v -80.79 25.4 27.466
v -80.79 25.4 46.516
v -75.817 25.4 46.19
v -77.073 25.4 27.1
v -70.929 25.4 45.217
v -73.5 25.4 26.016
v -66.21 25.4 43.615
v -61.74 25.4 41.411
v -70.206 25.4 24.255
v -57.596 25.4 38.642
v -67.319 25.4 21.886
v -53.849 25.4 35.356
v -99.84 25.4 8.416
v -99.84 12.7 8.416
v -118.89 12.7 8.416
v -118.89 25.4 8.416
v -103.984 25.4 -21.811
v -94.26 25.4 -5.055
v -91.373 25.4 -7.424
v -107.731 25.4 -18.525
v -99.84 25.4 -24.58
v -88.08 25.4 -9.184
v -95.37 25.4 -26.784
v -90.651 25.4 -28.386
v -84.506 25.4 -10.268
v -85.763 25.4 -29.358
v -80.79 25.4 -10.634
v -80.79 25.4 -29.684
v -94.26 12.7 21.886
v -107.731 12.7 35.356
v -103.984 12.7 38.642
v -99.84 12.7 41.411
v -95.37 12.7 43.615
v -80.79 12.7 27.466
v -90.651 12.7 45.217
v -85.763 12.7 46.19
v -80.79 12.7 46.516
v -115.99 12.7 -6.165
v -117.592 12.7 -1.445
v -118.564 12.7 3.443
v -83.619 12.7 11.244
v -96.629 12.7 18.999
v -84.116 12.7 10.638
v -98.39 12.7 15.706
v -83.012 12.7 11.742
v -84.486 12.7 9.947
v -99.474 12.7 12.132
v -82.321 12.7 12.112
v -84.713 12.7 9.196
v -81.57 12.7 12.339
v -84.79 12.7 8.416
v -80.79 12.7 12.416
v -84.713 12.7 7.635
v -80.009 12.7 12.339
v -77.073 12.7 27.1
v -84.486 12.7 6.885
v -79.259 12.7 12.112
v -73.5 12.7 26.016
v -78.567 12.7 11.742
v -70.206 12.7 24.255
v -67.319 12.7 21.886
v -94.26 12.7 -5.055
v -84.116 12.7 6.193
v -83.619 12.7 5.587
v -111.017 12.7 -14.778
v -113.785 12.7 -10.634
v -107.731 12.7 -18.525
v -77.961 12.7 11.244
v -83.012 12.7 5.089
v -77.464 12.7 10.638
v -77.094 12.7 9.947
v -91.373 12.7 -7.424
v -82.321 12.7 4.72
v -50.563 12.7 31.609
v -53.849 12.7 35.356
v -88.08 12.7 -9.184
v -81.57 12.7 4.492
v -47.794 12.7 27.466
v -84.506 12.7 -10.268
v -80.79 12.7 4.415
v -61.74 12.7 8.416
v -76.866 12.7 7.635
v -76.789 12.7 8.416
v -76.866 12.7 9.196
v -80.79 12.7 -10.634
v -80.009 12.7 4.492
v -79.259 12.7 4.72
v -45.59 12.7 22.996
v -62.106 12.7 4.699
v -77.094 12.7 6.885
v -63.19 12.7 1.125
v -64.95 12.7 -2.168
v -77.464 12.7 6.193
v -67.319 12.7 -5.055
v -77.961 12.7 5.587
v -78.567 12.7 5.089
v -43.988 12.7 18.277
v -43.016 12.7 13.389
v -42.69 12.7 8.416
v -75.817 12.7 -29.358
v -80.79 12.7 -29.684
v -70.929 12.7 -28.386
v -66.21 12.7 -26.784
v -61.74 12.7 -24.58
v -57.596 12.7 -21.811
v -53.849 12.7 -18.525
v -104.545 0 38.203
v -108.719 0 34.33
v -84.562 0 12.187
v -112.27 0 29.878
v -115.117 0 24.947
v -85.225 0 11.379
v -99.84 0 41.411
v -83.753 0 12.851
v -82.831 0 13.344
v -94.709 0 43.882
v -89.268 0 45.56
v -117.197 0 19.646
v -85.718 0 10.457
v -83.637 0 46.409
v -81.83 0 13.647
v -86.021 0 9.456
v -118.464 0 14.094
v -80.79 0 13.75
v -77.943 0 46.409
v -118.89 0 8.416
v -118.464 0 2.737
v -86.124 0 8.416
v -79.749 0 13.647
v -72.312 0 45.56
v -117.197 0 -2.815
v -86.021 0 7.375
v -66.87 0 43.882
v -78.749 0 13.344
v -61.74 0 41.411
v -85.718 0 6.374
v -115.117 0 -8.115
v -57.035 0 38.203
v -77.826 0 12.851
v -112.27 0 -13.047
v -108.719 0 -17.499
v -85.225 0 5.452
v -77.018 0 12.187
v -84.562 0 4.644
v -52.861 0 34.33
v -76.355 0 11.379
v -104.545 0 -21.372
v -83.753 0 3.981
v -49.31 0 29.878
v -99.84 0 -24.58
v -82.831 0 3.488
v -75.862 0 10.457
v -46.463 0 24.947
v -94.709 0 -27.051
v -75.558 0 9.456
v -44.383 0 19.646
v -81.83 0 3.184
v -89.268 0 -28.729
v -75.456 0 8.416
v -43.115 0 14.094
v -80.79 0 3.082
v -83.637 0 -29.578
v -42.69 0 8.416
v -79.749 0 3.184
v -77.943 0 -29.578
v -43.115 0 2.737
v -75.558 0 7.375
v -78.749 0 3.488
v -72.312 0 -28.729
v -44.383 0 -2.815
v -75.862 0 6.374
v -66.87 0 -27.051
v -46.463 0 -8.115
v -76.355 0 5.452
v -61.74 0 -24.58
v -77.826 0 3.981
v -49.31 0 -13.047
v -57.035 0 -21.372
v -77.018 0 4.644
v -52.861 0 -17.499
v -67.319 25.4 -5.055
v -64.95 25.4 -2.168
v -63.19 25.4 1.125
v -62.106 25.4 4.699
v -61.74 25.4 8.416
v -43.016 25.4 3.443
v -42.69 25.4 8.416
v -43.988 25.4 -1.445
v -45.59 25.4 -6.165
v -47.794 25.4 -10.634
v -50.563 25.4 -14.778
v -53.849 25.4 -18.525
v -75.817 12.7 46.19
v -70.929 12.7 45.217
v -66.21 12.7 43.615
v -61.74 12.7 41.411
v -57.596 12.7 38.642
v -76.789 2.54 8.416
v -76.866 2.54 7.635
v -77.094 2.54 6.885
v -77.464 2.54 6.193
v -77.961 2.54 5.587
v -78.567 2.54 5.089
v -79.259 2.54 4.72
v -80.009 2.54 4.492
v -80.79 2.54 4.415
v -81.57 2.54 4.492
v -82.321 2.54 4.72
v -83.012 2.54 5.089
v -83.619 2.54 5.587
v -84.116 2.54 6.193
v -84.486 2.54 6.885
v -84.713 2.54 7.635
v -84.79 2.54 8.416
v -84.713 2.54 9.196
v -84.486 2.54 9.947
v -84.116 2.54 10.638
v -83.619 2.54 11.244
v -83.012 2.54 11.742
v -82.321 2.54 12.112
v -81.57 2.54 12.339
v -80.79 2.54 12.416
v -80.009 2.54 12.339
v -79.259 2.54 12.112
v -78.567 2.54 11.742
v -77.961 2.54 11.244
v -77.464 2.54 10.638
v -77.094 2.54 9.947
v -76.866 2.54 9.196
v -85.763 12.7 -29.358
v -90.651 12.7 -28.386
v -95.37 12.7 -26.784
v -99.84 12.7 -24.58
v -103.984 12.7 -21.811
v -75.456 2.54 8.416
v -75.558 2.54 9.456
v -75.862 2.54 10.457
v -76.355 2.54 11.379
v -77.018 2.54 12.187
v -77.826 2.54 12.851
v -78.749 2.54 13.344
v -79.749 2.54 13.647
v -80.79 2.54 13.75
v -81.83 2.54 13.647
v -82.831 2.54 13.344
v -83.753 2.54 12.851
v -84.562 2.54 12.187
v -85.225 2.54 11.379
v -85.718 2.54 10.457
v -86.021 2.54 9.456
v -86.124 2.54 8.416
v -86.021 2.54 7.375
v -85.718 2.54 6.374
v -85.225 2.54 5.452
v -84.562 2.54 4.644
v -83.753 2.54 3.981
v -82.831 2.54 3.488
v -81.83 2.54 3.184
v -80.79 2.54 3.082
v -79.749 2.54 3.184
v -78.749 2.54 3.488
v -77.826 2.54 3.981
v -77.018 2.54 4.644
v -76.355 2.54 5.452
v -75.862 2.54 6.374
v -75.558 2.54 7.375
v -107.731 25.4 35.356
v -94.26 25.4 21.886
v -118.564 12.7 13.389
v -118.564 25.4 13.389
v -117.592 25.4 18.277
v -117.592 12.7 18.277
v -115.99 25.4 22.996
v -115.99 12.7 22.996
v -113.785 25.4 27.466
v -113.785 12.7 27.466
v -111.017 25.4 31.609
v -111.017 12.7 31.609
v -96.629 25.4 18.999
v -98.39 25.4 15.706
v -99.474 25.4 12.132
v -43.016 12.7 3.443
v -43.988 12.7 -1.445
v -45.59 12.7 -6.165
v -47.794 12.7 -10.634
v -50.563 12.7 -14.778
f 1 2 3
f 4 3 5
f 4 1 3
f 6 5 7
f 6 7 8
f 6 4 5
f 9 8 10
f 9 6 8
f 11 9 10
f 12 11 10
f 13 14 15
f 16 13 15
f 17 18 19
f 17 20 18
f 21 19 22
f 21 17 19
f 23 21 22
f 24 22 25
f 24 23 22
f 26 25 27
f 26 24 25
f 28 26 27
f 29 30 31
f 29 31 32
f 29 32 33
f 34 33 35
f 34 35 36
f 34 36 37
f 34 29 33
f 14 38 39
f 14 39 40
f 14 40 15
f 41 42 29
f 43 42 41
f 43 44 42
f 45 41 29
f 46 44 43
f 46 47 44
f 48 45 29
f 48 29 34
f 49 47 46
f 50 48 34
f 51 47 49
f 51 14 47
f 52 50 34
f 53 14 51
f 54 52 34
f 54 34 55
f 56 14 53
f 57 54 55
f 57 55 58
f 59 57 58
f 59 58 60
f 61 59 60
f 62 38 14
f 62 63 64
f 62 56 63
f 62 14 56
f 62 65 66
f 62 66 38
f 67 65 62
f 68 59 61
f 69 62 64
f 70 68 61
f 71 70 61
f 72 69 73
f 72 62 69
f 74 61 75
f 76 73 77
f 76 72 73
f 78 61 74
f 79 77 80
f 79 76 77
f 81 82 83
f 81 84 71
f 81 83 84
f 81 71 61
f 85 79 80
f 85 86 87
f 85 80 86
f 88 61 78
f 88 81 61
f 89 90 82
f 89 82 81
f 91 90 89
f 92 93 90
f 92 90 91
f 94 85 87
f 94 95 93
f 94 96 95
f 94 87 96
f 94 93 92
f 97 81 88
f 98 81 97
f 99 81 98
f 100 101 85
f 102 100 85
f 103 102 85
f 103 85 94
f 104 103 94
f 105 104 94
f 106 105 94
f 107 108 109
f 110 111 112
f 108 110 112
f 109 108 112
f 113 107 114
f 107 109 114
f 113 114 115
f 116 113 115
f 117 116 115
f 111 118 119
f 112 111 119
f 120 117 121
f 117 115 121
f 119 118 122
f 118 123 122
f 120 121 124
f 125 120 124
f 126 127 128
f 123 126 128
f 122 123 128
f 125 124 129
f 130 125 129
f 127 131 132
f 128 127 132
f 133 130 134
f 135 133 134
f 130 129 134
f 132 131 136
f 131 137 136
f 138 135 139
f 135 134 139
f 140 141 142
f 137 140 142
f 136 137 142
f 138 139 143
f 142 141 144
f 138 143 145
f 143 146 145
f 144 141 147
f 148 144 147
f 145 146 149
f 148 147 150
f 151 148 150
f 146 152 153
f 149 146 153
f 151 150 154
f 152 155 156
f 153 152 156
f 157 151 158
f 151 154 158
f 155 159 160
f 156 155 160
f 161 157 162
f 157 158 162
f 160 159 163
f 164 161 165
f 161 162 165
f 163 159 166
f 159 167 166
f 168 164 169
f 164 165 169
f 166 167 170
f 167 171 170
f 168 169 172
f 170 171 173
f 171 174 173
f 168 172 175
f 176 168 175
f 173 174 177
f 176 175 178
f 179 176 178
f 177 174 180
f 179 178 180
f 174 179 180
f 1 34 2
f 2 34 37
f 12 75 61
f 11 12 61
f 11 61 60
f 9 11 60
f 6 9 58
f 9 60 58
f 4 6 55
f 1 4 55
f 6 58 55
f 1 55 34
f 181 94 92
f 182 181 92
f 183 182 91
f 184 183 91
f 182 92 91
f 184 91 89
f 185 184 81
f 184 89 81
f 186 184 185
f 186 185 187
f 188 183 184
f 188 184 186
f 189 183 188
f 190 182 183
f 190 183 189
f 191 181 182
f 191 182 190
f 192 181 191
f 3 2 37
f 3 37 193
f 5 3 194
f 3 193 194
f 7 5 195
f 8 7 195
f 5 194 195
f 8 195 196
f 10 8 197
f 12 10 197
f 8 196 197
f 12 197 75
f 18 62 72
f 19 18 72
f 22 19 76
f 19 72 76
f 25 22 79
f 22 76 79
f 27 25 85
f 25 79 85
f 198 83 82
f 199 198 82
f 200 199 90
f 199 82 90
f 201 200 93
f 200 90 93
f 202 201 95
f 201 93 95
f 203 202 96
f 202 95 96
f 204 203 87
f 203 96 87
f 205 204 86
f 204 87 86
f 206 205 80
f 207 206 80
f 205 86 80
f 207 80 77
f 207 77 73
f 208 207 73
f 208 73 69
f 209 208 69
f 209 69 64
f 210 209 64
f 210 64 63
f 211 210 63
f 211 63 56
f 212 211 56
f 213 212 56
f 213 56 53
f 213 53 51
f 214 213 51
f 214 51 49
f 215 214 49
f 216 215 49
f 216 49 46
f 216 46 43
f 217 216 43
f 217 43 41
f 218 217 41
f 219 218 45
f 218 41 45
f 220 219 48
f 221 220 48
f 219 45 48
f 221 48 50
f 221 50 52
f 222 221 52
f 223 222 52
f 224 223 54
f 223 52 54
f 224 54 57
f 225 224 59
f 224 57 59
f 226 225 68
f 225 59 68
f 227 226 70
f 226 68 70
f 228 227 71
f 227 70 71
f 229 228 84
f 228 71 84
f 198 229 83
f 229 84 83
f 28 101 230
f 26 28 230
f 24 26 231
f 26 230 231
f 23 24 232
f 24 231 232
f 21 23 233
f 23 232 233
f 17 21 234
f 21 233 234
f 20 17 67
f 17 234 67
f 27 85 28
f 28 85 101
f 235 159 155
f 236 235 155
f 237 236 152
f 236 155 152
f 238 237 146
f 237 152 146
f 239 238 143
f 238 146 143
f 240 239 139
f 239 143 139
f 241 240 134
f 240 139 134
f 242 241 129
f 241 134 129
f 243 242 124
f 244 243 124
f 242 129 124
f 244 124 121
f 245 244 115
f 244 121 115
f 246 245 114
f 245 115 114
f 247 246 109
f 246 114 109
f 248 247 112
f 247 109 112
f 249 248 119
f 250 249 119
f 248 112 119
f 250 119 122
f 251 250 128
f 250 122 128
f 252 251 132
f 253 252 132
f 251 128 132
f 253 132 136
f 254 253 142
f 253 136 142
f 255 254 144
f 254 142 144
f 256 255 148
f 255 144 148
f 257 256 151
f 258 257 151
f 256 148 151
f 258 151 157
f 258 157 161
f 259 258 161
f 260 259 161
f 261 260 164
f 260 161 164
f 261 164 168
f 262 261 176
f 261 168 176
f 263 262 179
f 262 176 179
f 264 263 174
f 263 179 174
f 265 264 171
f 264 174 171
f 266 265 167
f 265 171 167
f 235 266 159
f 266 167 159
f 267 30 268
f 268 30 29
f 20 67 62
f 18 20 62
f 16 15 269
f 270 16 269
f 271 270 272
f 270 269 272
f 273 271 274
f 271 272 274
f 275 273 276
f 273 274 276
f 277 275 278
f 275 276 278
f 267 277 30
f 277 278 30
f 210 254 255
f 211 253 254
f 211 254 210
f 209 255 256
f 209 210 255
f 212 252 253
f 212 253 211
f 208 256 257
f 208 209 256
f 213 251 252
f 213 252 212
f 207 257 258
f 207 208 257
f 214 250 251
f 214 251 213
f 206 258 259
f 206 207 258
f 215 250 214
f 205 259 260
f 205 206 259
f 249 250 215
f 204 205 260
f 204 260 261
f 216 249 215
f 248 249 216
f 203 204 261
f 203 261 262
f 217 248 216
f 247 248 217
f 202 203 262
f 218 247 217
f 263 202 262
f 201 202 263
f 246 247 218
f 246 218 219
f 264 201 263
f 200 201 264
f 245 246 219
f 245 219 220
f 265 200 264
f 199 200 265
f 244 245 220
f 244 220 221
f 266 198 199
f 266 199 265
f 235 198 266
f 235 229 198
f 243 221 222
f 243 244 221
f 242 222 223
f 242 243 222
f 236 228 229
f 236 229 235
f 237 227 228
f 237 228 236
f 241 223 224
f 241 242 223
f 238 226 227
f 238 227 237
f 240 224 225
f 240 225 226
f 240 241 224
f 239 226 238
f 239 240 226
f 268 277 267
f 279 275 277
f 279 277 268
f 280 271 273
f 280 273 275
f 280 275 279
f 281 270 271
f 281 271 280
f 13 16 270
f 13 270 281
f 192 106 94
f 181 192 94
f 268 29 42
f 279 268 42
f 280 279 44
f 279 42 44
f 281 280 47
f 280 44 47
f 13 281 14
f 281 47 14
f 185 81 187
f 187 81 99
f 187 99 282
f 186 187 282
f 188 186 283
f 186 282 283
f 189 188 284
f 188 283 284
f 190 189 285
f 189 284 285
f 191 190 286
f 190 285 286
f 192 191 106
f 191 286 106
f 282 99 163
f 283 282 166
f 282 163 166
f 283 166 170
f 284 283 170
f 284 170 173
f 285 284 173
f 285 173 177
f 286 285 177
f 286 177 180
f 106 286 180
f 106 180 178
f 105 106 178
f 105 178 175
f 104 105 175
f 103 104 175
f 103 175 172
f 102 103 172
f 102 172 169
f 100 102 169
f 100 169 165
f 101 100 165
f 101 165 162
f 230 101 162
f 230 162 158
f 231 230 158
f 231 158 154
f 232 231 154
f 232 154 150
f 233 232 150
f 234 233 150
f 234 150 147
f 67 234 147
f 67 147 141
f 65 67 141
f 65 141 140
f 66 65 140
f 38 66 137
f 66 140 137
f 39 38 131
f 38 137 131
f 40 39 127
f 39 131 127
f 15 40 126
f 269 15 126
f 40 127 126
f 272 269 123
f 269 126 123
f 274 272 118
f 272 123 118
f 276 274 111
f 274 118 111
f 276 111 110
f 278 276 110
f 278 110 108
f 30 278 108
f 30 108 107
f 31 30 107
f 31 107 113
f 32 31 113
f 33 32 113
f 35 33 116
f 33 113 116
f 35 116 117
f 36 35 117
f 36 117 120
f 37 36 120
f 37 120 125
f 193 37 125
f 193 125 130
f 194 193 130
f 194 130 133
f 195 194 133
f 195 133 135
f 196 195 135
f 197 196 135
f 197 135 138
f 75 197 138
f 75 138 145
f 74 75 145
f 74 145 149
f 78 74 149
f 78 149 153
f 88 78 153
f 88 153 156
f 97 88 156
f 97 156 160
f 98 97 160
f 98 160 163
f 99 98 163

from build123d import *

# Parameters (mm, degrees)
SKETCH1_R           = 38.1
BOSS_EXTRUDE1_DEPTH = 12.7
SKETCH2_R           = 4.0005
CUT_EXTRUDE1_DEPTH  = 12.7
BOSS_EXTRUDE2_DEPTH = 12.7
SKETCH5_R           = 5.334
CUT_EXTRUDE2_DEPTH  = 2.54


with BuildPart() as part:
    # Sketch1 → Boss-Extrude1 (new body)
    with BuildSketch(Plane(origin=(0, 0, 0), x_dir=(1, 0, 0), z_dir=(0, 1, 0))):
        with Locations((-80.789858777, -8.415610289)):
            Circle(SKETCH1_R)
    extrude(amount=BOSS_EXTRUDE1_DEPTH)

    # Sketch2 → Cut-Extrude1 (cut)
    with BuildSketch(Plane(origin=(0, 12.7, 0), x_dir=(1, 0, 0), z_dir=(0, 1, 0))):
        with Locations((-80.789858777, -8.415610289)):
            Circle(SKETCH2_R)
    extrude(amount=-CUT_EXTRUDE1_DEPTH, mode=Mode.SUBTRACT)

    # Sketch3 → Boss-Extrude2 (add)
    with BuildSketch(Plane(origin=(0, 12.7, 0), x_dir=(1, 0, 0), z_dir=(0, 1, 0))):
        with BuildLine():
            ThreePointArc((-94.260242958, 5.054773892), (-88.079978163, 9.184294805), (-80.789858777, 10.634389711))
            Line((-80.789858777, 10.634389711), (-80.789858777, 29.684389711))
            ThreePointArc((-80.789858777, 29.684389711), (-95.37009755, 26.784199899), (-107.73062714, 18.525158074))
            Line((-107.73062714, 18.525158074), (-94.260242958, 5.054773892))
        make_face()
        with BuildLine():
            Line((-53.849090413, 18.525158074), (-67.319474595, 5.054773892))
            ThreePointArc((-67.319474595, 5.054773892), (-63.189953682, -1.125490903), (-61.739858777, -8.415610289))
            Line((-61.739858777, -8.415610289), (-42.689858777, -8.415610289))
            ThreePointArc((-42.689858777, -8.415610289), (-45.590048588, 6.164628484), (-53.849090413, 18.525158074))
        make_face()
        with BuildLine():
            Line((-53.849090413, -35.356378652), (-67.319474595, -21.885994471))
            ThreePointArc((-67.319474595, -21.885994471), (-73.49973939, -26.015515384), (-80.789858777, -27.465610289))
            Line((-80.789858777, -27.465610289), (-80.789858777, -46.515610289))
            ThreePointArc((-80.789858777, -46.515610289), (-66.209620003, -43.615420478), (-53.849090413, -35.356378652))
        make_face()
        with BuildLine():
            ThreePointArc((-94.260242958, -21.885994471), (-98.389763871, -15.705729676), (-99.839858777, -8.415610289))
            Line((-99.839858777, -8.415610289), (-118.889858777, -8.415610289))
            ThreePointArc((-118.889858777, -8.415610289), (-115.989668965, -22.995849062), (-107.73062714, -35.356378652))
            Line((-107.73062714, -35.356378652), (-94.260242958, -21.885994471))
        make_face()
    extrude(amount=BOSS_EXTRUDE2_DEPTH)

    # Sketch5 → Cut-Extrude2 (cut)
    with BuildSketch(Plane.XZ):
        with Locations((-80.789858777, 8.415610289)):
            Circle(SKETCH5_R)
    extrude(amount=-CUT_EXTRUDE2_DEPTH, mode=Mode.SUBTRACT)


solid = part.part
